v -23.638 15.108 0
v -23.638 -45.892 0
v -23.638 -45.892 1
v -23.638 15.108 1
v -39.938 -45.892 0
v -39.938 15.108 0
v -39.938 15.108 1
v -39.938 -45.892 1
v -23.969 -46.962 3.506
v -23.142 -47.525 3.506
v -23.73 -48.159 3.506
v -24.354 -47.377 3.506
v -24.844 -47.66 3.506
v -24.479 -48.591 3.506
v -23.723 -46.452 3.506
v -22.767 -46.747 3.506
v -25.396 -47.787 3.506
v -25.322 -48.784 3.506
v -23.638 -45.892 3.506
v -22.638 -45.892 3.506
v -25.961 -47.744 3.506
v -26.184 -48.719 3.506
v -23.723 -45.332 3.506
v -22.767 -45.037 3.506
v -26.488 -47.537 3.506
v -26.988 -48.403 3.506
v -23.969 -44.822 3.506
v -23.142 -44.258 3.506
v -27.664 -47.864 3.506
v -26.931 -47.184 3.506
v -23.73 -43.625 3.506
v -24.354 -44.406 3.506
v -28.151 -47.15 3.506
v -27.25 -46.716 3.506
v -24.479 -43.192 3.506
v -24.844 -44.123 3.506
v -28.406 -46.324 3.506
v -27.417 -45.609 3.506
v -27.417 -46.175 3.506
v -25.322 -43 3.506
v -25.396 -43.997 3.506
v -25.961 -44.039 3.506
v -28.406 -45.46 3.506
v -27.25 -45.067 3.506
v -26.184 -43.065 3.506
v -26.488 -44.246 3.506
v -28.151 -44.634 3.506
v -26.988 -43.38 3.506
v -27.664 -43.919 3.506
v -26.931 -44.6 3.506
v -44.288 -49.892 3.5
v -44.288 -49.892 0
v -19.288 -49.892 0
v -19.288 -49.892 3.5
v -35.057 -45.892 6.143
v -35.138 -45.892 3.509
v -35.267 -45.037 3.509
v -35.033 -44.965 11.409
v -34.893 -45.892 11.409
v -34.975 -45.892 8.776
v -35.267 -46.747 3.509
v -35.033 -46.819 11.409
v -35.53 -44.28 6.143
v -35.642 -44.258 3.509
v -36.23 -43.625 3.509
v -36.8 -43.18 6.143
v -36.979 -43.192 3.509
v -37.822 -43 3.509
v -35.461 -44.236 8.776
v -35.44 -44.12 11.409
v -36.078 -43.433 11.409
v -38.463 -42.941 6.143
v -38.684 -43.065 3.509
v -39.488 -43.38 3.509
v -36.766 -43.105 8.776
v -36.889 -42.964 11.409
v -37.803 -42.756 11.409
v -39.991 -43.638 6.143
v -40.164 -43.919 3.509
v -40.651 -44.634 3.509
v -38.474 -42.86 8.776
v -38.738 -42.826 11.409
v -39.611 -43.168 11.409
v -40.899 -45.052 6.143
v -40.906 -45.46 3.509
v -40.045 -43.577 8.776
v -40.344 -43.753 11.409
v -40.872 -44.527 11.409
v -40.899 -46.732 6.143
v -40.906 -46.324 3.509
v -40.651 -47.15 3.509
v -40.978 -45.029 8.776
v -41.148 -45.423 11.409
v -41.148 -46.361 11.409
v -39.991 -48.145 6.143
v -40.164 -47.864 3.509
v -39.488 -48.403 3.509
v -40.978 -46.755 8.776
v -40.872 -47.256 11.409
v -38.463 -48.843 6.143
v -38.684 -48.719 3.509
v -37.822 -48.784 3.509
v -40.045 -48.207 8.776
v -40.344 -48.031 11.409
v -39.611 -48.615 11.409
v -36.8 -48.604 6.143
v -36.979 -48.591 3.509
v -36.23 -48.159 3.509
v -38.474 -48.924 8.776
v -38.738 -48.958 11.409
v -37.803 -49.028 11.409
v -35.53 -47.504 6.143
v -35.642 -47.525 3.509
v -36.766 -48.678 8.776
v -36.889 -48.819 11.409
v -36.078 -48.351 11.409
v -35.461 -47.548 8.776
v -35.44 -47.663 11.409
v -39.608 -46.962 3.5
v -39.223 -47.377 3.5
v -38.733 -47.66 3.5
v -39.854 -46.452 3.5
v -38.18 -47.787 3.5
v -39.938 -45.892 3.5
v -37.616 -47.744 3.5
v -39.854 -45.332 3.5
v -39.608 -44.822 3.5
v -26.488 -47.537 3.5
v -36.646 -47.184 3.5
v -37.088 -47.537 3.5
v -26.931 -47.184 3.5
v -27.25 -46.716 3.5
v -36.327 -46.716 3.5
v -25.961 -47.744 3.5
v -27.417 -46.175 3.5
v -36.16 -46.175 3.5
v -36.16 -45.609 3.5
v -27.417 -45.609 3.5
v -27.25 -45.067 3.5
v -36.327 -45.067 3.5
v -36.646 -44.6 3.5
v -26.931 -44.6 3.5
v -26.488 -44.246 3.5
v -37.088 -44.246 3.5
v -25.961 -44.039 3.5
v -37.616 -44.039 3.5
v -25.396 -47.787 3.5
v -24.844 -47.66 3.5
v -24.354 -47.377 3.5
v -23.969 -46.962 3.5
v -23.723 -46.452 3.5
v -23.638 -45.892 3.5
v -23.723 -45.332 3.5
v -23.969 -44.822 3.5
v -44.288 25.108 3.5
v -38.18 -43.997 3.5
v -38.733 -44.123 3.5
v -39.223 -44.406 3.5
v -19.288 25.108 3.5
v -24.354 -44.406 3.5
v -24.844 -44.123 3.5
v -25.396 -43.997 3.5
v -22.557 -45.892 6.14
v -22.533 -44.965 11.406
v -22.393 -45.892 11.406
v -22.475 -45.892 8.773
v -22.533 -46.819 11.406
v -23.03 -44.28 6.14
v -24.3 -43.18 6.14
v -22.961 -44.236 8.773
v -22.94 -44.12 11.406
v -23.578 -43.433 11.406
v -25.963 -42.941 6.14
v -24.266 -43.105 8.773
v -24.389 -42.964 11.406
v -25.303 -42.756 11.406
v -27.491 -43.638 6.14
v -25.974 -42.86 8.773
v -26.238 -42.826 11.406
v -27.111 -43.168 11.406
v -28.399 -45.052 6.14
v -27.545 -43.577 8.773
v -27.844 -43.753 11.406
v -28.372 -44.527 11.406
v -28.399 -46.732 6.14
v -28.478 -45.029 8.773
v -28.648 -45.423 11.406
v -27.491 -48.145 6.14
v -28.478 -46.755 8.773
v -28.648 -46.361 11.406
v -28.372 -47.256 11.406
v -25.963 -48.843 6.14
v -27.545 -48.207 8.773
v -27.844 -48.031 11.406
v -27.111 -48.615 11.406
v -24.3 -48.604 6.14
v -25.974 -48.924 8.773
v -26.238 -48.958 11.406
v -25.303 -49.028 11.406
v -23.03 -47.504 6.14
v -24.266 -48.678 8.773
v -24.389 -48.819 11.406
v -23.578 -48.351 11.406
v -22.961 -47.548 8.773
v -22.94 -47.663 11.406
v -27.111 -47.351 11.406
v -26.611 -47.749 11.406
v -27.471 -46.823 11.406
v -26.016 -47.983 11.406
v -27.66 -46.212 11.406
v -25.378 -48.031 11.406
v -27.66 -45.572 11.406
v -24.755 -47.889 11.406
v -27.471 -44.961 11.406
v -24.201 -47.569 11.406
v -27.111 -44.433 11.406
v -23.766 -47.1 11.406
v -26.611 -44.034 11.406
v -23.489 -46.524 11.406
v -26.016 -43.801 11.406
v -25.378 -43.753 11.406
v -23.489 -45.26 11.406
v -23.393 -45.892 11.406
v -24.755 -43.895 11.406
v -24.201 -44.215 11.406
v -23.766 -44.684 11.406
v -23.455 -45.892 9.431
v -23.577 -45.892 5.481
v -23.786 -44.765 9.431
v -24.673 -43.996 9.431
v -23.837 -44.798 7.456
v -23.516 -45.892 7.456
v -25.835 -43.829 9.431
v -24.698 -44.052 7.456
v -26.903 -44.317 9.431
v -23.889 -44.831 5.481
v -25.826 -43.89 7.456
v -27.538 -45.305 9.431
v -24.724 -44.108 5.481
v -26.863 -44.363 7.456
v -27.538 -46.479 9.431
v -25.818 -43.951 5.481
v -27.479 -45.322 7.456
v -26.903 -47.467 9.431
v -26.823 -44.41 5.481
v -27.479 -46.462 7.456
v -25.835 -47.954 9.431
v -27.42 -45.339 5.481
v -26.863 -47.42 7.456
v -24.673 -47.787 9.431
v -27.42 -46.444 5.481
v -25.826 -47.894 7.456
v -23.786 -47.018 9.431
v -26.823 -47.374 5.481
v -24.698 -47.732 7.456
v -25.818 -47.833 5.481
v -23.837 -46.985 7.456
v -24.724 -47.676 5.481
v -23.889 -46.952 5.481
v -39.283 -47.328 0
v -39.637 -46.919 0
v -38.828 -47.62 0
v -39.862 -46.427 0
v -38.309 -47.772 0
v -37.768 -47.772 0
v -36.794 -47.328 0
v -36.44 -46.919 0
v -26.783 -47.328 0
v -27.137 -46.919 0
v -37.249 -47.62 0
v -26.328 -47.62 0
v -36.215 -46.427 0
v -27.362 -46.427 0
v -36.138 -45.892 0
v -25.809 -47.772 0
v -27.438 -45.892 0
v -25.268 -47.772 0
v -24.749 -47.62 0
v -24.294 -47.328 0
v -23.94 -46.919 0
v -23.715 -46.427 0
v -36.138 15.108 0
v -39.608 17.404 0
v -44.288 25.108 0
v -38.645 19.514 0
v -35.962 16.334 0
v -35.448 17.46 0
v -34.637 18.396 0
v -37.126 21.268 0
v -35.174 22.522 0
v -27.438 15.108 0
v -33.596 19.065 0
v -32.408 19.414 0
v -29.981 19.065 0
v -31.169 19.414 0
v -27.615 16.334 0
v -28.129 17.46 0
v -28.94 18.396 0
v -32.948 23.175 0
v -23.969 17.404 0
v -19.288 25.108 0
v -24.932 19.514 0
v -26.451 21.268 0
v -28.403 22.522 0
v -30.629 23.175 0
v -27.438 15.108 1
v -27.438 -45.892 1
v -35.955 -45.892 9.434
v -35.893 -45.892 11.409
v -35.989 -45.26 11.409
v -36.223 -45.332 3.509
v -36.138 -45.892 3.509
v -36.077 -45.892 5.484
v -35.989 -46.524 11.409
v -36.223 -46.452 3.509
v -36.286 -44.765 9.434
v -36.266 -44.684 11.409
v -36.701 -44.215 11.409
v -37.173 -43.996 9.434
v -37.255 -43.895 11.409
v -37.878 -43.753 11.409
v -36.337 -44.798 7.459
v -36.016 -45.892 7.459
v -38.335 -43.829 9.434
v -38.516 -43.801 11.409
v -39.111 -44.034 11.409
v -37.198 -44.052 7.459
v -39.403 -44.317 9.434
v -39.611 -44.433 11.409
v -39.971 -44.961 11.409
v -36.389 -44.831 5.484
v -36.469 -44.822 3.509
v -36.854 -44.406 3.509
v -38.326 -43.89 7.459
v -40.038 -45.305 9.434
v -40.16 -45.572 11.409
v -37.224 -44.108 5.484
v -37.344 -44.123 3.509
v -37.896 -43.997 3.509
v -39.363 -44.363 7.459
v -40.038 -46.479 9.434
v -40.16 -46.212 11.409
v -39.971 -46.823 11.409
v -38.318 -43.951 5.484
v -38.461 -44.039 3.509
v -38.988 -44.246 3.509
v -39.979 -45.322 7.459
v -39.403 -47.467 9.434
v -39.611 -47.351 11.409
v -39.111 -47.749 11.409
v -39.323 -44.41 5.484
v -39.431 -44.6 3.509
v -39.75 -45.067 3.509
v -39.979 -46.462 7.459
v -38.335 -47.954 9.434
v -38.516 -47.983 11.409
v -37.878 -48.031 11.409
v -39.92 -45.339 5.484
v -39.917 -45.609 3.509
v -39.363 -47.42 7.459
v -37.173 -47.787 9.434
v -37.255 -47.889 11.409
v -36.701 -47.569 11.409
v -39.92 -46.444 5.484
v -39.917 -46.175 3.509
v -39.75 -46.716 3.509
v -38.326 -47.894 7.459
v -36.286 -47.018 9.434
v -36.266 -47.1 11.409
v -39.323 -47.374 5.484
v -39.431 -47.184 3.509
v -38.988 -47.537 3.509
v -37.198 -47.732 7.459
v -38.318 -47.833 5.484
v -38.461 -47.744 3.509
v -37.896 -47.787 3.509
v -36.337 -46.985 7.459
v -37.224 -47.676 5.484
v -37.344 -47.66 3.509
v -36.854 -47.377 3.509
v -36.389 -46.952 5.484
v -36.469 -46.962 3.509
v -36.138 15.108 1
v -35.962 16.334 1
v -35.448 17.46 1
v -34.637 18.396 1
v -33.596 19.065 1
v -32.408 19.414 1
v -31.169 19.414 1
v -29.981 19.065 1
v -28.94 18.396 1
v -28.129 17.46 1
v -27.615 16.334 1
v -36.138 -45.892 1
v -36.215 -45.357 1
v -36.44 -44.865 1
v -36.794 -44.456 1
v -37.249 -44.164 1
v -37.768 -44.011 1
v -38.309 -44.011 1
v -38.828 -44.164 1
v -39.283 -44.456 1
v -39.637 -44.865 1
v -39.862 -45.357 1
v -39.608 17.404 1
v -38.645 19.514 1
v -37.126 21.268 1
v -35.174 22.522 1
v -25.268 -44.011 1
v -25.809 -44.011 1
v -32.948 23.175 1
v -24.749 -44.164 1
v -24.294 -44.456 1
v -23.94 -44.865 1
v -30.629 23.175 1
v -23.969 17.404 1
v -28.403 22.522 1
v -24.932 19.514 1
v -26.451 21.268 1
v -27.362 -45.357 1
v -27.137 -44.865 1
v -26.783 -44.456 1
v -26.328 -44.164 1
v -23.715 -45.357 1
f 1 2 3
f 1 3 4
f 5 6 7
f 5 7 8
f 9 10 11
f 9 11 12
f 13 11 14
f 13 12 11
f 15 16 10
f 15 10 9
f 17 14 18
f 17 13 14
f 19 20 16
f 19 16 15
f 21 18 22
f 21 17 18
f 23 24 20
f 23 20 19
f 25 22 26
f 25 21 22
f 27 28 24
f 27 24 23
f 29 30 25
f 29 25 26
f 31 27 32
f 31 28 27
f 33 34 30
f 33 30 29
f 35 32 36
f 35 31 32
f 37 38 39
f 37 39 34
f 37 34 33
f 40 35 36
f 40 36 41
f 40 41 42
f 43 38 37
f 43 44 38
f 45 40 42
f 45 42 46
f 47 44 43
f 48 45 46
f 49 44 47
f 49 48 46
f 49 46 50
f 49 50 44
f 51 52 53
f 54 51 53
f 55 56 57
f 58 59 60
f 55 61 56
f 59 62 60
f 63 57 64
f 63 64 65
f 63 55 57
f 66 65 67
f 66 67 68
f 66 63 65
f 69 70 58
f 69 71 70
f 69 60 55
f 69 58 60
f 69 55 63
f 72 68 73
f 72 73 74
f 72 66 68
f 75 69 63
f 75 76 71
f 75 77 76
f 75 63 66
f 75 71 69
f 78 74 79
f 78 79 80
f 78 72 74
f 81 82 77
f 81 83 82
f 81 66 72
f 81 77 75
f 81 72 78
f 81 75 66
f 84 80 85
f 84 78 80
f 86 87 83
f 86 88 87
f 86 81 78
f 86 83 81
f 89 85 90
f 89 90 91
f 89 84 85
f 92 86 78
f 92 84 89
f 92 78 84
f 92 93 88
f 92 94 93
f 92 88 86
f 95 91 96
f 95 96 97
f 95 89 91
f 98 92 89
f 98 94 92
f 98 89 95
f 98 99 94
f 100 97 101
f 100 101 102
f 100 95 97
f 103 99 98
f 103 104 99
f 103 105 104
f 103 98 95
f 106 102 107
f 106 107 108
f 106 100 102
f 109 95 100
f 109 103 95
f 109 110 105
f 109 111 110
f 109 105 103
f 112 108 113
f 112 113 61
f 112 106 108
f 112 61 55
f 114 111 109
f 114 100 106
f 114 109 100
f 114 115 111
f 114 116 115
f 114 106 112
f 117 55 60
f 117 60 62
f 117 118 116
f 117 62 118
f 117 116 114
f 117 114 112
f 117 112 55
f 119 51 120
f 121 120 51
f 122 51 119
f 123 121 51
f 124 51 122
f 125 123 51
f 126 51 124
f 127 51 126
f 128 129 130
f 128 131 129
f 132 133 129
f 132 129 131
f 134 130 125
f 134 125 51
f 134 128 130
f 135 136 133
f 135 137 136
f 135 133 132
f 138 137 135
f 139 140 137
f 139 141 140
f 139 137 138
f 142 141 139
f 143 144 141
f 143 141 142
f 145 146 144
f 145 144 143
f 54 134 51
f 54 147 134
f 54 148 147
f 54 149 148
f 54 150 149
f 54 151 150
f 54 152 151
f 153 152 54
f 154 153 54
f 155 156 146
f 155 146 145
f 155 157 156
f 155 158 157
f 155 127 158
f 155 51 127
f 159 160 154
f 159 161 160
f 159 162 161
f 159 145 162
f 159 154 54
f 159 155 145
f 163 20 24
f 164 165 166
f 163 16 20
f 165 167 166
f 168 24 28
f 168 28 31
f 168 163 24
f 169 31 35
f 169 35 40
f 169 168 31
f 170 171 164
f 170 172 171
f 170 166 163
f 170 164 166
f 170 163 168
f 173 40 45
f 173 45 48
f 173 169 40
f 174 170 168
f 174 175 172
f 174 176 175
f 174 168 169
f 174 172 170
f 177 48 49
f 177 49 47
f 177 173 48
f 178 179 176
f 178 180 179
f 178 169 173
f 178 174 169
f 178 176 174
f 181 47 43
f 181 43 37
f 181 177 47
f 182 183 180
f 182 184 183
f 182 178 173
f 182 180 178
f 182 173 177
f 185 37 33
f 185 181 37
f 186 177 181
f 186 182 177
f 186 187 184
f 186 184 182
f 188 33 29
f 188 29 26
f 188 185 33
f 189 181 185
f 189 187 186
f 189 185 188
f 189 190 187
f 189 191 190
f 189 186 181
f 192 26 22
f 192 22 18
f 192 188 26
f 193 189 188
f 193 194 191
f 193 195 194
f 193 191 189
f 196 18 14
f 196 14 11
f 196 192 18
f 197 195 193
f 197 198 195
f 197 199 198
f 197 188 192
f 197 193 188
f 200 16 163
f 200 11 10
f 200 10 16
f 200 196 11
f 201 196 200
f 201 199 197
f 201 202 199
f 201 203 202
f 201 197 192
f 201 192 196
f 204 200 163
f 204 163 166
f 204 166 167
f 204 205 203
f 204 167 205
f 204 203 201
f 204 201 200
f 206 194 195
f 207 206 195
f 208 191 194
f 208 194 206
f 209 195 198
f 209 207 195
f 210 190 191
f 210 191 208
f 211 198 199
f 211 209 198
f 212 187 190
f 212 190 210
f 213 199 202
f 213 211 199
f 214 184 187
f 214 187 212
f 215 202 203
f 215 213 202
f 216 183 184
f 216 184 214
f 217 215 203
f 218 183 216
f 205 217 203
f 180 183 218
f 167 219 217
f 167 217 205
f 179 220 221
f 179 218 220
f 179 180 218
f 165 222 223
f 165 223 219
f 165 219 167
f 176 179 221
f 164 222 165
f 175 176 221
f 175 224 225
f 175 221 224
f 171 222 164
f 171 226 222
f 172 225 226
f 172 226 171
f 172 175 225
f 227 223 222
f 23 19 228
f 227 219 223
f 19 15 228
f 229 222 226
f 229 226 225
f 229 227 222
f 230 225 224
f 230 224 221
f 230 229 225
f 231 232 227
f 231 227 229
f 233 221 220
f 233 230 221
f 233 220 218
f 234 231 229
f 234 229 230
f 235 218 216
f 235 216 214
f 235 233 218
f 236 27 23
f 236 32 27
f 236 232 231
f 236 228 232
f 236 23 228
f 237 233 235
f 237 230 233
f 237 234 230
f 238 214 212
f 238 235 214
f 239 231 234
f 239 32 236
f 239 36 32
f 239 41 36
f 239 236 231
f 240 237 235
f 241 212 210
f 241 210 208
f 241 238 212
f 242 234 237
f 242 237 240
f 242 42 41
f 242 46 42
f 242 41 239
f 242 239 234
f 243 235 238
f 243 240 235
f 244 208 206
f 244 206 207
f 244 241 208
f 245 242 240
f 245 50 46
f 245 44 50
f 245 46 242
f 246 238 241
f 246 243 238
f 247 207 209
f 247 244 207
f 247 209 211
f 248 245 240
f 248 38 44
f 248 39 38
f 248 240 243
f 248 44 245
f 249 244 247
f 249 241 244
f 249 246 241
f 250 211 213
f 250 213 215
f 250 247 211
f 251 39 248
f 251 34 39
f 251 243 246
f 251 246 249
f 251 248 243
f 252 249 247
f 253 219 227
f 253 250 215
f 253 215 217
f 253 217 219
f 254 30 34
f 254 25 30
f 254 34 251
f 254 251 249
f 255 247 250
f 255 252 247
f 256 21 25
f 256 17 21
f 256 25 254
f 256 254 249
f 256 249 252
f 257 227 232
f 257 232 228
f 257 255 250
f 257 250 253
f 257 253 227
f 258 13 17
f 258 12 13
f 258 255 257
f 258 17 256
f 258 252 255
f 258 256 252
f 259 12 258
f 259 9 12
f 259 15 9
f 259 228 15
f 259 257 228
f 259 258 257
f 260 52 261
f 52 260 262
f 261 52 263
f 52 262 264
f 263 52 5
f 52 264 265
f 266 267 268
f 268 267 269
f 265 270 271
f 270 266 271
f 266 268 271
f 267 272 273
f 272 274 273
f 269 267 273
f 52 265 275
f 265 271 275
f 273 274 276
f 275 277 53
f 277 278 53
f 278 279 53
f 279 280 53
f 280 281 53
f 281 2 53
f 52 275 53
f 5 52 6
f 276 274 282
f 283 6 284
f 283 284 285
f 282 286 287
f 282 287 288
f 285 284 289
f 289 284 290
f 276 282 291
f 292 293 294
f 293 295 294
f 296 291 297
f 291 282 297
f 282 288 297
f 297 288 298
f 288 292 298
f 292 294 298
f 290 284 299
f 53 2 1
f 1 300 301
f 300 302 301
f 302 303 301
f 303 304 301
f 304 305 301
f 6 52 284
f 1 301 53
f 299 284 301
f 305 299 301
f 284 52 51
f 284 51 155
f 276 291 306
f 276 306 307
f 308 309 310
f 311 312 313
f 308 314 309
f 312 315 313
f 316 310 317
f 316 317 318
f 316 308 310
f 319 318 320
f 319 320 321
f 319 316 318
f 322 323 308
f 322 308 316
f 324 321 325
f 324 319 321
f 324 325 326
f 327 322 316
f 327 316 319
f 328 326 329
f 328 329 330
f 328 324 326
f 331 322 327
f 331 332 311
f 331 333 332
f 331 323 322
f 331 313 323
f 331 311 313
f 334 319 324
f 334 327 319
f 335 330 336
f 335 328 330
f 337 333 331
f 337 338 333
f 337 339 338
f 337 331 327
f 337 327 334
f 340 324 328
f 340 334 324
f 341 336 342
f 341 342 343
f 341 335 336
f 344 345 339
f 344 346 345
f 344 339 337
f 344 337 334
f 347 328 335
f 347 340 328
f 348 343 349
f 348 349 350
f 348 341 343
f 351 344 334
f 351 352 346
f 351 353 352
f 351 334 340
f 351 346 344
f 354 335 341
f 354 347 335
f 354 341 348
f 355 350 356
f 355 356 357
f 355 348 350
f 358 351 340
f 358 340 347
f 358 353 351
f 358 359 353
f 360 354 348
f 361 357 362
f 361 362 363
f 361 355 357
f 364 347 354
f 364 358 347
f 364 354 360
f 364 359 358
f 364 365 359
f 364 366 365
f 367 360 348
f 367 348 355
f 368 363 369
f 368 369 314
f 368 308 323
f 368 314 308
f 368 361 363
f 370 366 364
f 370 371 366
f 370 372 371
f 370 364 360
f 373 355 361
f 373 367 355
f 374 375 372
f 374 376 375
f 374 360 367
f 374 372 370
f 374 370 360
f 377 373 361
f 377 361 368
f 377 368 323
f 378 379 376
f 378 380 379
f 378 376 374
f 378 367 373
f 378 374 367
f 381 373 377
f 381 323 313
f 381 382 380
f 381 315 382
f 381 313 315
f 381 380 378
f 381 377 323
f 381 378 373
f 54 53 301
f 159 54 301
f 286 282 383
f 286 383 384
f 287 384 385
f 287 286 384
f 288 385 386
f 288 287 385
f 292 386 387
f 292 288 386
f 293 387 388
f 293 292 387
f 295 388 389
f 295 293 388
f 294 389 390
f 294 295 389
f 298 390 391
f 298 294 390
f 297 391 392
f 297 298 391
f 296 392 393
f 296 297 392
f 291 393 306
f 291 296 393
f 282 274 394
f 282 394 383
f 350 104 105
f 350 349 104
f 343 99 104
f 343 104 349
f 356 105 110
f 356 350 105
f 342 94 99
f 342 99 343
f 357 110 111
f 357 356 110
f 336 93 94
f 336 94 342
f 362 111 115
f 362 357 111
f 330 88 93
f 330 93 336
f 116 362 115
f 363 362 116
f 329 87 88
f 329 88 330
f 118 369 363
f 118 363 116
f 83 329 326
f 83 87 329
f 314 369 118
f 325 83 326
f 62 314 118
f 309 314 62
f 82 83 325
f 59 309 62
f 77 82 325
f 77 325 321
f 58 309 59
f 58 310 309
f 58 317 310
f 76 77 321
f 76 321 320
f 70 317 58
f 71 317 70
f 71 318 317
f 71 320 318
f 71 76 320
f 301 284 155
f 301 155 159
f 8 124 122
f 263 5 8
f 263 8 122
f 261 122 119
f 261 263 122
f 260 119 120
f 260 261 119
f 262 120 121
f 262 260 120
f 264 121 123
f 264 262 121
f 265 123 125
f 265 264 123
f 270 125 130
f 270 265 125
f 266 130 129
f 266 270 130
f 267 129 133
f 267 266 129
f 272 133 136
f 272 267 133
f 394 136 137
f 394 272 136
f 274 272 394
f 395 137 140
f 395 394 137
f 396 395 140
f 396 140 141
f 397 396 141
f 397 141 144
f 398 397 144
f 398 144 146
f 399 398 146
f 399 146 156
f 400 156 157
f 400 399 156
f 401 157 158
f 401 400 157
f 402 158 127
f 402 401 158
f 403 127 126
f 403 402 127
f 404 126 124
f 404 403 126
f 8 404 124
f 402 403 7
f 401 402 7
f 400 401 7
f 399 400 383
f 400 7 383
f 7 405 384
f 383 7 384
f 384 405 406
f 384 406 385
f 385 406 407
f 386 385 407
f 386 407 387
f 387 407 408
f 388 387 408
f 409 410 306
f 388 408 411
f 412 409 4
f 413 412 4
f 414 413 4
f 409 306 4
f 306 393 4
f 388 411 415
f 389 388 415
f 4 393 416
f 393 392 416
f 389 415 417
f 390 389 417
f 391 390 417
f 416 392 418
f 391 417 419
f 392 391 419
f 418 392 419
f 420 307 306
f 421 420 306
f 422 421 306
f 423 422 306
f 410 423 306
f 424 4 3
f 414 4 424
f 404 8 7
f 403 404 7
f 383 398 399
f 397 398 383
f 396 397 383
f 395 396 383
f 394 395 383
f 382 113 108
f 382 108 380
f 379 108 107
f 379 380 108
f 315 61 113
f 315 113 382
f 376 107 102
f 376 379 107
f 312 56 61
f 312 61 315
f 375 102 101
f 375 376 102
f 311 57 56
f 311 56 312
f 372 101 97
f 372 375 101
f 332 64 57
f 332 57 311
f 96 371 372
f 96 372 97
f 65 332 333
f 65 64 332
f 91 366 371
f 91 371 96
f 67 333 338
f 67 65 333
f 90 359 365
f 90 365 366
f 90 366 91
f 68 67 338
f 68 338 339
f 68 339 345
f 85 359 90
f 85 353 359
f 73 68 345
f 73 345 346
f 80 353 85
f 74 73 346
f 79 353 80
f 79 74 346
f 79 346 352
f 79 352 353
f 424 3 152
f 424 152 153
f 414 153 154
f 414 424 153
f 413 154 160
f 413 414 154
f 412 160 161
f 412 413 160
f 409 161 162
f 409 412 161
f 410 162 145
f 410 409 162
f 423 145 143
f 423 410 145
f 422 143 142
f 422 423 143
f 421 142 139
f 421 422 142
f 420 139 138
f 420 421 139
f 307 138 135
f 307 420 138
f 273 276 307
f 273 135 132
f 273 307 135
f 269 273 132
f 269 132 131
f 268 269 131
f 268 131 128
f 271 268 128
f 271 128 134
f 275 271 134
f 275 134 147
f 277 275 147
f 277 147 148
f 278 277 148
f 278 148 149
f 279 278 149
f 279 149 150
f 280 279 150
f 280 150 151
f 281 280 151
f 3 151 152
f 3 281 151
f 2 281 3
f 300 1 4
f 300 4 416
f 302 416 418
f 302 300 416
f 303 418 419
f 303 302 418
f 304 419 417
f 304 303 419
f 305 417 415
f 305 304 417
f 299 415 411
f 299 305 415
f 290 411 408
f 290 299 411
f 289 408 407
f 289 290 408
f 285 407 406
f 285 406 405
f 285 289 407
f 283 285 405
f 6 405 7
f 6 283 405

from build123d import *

# Parameters (mm, degrees)
F0_W     = 25
F0_H     = 75
F3_DEPTH = 3.5
F4_DEPTH = 1
F2_R     = 1.9
F5_DEPTH = 3.5


with BuildPart() as f3:
    # F0 (on Top) → F3 (new body)
    with BuildSketch(Plane.XY):
        with Locations((-31.788486, -12.391831)):
            Rectangle(F0_W, F0_H)
    extrude(amount=F3_DEPTH)

    # F1 (on face) → F4 (cut)
    with BuildSketch(Plane.XY):
        with BuildLine():
            ThreePointArc((-27.438486, -45.891831), (-25.538486, -47.791831), (-23.638486, -45.891831))
            ThreePointArc((-23.638486, -45.891831), (-25.538486, -43.991831), (-27.438486, -45.891831))
        make_face()
        with BuildLine():
            ThreePointArc((-27.438486, -45.891831), (-25.538486, -43.991831), (-23.638486, -45.891831))
            Line((-23.638486, -45.891831), (-23.638486, 15.108169))
            ThreePointArc((-23.638486, 15.108169), (-31.788486, 23.258169), (-39.938486, 15.108169))
            Line((-39.938486, 15.108169), (-39.938486, -45.891831))
            ThreePointArc((-39.938486, -45.891831), (-38.038486, -43.991831), (-36.138486, -45.891831))
            Line((-36.138486, -45.891831), (-36.138486, 15.108169))
            ThreePointArc((-36.138486, 15.108169), (-31.788486, 19.458169), (-27.438486, 15.108169))
            Line((-27.438486, 15.108169), (-27.438486, -45.891831))
        make_face()
        with BuildLine():
            ThreePointArc((-36.138486, -45.891831), (-38.038486, -43.991831), (-39.938486, -45.891831))
            ThreePointArc((-39.938486, -45.891831), (-38.038486, -47.791831), (-36.138486, -45.891831))
        make_face()
    extrude(amount=F4_DEPTH, mode=Mode.SUBTRACT)

    # F2 (on Top) + F1 (on face) → F5 (cut)
    with BuildSketch(Plane.XY):
        with Locations((-25.538486, -45.891831)):
            Circle(F2_R)
    with BuildSketch(Plane.XY):
        with BuildLine():
            ThreePointArc((-36.138486, -45.891831), (-38.038486, -43.991831), (-39.938486, -45.891831))
            ThreePointArc((-39.938486, -45.891831), (-38.038486, -47.791831), (-36.138486, -45.891831))
        make_face()
    extrude(amount=F5_DEPTH, mode=Mode.SUBTRACT)


with BuildPart() as f8:
    # F7 (on offset) → F8 (revolve)
    with BuildSketch(Plane.XZ.offset(45.89183)):
        Polygon((-35.893486, 11.409332), (-36.138486, 3.509332), (-35.138486, 3.509332), (-34.893486, 11.409332), align=None)
    revolve(axis=Axis((-38.038486, -45.89183, 7.459332), (0, 0, 1)))


with BuildPart() as f10:
    # F9 (on offset) → F10 (revolve)
    with BuildSketch(Plane.XZ.offset(45.89183)):
        Polygon((-23.393483, 11.406376), (-23.638483, 3.506376), (-22.638483, 3.506376), (-22.393483, 11.406376), align=None)
    revolve(axis=Axis((-25.538483, -45.89183, 8.424162), (0, 0, 1)))


solid = Compound([f3.part, f8.part, f10.part])
